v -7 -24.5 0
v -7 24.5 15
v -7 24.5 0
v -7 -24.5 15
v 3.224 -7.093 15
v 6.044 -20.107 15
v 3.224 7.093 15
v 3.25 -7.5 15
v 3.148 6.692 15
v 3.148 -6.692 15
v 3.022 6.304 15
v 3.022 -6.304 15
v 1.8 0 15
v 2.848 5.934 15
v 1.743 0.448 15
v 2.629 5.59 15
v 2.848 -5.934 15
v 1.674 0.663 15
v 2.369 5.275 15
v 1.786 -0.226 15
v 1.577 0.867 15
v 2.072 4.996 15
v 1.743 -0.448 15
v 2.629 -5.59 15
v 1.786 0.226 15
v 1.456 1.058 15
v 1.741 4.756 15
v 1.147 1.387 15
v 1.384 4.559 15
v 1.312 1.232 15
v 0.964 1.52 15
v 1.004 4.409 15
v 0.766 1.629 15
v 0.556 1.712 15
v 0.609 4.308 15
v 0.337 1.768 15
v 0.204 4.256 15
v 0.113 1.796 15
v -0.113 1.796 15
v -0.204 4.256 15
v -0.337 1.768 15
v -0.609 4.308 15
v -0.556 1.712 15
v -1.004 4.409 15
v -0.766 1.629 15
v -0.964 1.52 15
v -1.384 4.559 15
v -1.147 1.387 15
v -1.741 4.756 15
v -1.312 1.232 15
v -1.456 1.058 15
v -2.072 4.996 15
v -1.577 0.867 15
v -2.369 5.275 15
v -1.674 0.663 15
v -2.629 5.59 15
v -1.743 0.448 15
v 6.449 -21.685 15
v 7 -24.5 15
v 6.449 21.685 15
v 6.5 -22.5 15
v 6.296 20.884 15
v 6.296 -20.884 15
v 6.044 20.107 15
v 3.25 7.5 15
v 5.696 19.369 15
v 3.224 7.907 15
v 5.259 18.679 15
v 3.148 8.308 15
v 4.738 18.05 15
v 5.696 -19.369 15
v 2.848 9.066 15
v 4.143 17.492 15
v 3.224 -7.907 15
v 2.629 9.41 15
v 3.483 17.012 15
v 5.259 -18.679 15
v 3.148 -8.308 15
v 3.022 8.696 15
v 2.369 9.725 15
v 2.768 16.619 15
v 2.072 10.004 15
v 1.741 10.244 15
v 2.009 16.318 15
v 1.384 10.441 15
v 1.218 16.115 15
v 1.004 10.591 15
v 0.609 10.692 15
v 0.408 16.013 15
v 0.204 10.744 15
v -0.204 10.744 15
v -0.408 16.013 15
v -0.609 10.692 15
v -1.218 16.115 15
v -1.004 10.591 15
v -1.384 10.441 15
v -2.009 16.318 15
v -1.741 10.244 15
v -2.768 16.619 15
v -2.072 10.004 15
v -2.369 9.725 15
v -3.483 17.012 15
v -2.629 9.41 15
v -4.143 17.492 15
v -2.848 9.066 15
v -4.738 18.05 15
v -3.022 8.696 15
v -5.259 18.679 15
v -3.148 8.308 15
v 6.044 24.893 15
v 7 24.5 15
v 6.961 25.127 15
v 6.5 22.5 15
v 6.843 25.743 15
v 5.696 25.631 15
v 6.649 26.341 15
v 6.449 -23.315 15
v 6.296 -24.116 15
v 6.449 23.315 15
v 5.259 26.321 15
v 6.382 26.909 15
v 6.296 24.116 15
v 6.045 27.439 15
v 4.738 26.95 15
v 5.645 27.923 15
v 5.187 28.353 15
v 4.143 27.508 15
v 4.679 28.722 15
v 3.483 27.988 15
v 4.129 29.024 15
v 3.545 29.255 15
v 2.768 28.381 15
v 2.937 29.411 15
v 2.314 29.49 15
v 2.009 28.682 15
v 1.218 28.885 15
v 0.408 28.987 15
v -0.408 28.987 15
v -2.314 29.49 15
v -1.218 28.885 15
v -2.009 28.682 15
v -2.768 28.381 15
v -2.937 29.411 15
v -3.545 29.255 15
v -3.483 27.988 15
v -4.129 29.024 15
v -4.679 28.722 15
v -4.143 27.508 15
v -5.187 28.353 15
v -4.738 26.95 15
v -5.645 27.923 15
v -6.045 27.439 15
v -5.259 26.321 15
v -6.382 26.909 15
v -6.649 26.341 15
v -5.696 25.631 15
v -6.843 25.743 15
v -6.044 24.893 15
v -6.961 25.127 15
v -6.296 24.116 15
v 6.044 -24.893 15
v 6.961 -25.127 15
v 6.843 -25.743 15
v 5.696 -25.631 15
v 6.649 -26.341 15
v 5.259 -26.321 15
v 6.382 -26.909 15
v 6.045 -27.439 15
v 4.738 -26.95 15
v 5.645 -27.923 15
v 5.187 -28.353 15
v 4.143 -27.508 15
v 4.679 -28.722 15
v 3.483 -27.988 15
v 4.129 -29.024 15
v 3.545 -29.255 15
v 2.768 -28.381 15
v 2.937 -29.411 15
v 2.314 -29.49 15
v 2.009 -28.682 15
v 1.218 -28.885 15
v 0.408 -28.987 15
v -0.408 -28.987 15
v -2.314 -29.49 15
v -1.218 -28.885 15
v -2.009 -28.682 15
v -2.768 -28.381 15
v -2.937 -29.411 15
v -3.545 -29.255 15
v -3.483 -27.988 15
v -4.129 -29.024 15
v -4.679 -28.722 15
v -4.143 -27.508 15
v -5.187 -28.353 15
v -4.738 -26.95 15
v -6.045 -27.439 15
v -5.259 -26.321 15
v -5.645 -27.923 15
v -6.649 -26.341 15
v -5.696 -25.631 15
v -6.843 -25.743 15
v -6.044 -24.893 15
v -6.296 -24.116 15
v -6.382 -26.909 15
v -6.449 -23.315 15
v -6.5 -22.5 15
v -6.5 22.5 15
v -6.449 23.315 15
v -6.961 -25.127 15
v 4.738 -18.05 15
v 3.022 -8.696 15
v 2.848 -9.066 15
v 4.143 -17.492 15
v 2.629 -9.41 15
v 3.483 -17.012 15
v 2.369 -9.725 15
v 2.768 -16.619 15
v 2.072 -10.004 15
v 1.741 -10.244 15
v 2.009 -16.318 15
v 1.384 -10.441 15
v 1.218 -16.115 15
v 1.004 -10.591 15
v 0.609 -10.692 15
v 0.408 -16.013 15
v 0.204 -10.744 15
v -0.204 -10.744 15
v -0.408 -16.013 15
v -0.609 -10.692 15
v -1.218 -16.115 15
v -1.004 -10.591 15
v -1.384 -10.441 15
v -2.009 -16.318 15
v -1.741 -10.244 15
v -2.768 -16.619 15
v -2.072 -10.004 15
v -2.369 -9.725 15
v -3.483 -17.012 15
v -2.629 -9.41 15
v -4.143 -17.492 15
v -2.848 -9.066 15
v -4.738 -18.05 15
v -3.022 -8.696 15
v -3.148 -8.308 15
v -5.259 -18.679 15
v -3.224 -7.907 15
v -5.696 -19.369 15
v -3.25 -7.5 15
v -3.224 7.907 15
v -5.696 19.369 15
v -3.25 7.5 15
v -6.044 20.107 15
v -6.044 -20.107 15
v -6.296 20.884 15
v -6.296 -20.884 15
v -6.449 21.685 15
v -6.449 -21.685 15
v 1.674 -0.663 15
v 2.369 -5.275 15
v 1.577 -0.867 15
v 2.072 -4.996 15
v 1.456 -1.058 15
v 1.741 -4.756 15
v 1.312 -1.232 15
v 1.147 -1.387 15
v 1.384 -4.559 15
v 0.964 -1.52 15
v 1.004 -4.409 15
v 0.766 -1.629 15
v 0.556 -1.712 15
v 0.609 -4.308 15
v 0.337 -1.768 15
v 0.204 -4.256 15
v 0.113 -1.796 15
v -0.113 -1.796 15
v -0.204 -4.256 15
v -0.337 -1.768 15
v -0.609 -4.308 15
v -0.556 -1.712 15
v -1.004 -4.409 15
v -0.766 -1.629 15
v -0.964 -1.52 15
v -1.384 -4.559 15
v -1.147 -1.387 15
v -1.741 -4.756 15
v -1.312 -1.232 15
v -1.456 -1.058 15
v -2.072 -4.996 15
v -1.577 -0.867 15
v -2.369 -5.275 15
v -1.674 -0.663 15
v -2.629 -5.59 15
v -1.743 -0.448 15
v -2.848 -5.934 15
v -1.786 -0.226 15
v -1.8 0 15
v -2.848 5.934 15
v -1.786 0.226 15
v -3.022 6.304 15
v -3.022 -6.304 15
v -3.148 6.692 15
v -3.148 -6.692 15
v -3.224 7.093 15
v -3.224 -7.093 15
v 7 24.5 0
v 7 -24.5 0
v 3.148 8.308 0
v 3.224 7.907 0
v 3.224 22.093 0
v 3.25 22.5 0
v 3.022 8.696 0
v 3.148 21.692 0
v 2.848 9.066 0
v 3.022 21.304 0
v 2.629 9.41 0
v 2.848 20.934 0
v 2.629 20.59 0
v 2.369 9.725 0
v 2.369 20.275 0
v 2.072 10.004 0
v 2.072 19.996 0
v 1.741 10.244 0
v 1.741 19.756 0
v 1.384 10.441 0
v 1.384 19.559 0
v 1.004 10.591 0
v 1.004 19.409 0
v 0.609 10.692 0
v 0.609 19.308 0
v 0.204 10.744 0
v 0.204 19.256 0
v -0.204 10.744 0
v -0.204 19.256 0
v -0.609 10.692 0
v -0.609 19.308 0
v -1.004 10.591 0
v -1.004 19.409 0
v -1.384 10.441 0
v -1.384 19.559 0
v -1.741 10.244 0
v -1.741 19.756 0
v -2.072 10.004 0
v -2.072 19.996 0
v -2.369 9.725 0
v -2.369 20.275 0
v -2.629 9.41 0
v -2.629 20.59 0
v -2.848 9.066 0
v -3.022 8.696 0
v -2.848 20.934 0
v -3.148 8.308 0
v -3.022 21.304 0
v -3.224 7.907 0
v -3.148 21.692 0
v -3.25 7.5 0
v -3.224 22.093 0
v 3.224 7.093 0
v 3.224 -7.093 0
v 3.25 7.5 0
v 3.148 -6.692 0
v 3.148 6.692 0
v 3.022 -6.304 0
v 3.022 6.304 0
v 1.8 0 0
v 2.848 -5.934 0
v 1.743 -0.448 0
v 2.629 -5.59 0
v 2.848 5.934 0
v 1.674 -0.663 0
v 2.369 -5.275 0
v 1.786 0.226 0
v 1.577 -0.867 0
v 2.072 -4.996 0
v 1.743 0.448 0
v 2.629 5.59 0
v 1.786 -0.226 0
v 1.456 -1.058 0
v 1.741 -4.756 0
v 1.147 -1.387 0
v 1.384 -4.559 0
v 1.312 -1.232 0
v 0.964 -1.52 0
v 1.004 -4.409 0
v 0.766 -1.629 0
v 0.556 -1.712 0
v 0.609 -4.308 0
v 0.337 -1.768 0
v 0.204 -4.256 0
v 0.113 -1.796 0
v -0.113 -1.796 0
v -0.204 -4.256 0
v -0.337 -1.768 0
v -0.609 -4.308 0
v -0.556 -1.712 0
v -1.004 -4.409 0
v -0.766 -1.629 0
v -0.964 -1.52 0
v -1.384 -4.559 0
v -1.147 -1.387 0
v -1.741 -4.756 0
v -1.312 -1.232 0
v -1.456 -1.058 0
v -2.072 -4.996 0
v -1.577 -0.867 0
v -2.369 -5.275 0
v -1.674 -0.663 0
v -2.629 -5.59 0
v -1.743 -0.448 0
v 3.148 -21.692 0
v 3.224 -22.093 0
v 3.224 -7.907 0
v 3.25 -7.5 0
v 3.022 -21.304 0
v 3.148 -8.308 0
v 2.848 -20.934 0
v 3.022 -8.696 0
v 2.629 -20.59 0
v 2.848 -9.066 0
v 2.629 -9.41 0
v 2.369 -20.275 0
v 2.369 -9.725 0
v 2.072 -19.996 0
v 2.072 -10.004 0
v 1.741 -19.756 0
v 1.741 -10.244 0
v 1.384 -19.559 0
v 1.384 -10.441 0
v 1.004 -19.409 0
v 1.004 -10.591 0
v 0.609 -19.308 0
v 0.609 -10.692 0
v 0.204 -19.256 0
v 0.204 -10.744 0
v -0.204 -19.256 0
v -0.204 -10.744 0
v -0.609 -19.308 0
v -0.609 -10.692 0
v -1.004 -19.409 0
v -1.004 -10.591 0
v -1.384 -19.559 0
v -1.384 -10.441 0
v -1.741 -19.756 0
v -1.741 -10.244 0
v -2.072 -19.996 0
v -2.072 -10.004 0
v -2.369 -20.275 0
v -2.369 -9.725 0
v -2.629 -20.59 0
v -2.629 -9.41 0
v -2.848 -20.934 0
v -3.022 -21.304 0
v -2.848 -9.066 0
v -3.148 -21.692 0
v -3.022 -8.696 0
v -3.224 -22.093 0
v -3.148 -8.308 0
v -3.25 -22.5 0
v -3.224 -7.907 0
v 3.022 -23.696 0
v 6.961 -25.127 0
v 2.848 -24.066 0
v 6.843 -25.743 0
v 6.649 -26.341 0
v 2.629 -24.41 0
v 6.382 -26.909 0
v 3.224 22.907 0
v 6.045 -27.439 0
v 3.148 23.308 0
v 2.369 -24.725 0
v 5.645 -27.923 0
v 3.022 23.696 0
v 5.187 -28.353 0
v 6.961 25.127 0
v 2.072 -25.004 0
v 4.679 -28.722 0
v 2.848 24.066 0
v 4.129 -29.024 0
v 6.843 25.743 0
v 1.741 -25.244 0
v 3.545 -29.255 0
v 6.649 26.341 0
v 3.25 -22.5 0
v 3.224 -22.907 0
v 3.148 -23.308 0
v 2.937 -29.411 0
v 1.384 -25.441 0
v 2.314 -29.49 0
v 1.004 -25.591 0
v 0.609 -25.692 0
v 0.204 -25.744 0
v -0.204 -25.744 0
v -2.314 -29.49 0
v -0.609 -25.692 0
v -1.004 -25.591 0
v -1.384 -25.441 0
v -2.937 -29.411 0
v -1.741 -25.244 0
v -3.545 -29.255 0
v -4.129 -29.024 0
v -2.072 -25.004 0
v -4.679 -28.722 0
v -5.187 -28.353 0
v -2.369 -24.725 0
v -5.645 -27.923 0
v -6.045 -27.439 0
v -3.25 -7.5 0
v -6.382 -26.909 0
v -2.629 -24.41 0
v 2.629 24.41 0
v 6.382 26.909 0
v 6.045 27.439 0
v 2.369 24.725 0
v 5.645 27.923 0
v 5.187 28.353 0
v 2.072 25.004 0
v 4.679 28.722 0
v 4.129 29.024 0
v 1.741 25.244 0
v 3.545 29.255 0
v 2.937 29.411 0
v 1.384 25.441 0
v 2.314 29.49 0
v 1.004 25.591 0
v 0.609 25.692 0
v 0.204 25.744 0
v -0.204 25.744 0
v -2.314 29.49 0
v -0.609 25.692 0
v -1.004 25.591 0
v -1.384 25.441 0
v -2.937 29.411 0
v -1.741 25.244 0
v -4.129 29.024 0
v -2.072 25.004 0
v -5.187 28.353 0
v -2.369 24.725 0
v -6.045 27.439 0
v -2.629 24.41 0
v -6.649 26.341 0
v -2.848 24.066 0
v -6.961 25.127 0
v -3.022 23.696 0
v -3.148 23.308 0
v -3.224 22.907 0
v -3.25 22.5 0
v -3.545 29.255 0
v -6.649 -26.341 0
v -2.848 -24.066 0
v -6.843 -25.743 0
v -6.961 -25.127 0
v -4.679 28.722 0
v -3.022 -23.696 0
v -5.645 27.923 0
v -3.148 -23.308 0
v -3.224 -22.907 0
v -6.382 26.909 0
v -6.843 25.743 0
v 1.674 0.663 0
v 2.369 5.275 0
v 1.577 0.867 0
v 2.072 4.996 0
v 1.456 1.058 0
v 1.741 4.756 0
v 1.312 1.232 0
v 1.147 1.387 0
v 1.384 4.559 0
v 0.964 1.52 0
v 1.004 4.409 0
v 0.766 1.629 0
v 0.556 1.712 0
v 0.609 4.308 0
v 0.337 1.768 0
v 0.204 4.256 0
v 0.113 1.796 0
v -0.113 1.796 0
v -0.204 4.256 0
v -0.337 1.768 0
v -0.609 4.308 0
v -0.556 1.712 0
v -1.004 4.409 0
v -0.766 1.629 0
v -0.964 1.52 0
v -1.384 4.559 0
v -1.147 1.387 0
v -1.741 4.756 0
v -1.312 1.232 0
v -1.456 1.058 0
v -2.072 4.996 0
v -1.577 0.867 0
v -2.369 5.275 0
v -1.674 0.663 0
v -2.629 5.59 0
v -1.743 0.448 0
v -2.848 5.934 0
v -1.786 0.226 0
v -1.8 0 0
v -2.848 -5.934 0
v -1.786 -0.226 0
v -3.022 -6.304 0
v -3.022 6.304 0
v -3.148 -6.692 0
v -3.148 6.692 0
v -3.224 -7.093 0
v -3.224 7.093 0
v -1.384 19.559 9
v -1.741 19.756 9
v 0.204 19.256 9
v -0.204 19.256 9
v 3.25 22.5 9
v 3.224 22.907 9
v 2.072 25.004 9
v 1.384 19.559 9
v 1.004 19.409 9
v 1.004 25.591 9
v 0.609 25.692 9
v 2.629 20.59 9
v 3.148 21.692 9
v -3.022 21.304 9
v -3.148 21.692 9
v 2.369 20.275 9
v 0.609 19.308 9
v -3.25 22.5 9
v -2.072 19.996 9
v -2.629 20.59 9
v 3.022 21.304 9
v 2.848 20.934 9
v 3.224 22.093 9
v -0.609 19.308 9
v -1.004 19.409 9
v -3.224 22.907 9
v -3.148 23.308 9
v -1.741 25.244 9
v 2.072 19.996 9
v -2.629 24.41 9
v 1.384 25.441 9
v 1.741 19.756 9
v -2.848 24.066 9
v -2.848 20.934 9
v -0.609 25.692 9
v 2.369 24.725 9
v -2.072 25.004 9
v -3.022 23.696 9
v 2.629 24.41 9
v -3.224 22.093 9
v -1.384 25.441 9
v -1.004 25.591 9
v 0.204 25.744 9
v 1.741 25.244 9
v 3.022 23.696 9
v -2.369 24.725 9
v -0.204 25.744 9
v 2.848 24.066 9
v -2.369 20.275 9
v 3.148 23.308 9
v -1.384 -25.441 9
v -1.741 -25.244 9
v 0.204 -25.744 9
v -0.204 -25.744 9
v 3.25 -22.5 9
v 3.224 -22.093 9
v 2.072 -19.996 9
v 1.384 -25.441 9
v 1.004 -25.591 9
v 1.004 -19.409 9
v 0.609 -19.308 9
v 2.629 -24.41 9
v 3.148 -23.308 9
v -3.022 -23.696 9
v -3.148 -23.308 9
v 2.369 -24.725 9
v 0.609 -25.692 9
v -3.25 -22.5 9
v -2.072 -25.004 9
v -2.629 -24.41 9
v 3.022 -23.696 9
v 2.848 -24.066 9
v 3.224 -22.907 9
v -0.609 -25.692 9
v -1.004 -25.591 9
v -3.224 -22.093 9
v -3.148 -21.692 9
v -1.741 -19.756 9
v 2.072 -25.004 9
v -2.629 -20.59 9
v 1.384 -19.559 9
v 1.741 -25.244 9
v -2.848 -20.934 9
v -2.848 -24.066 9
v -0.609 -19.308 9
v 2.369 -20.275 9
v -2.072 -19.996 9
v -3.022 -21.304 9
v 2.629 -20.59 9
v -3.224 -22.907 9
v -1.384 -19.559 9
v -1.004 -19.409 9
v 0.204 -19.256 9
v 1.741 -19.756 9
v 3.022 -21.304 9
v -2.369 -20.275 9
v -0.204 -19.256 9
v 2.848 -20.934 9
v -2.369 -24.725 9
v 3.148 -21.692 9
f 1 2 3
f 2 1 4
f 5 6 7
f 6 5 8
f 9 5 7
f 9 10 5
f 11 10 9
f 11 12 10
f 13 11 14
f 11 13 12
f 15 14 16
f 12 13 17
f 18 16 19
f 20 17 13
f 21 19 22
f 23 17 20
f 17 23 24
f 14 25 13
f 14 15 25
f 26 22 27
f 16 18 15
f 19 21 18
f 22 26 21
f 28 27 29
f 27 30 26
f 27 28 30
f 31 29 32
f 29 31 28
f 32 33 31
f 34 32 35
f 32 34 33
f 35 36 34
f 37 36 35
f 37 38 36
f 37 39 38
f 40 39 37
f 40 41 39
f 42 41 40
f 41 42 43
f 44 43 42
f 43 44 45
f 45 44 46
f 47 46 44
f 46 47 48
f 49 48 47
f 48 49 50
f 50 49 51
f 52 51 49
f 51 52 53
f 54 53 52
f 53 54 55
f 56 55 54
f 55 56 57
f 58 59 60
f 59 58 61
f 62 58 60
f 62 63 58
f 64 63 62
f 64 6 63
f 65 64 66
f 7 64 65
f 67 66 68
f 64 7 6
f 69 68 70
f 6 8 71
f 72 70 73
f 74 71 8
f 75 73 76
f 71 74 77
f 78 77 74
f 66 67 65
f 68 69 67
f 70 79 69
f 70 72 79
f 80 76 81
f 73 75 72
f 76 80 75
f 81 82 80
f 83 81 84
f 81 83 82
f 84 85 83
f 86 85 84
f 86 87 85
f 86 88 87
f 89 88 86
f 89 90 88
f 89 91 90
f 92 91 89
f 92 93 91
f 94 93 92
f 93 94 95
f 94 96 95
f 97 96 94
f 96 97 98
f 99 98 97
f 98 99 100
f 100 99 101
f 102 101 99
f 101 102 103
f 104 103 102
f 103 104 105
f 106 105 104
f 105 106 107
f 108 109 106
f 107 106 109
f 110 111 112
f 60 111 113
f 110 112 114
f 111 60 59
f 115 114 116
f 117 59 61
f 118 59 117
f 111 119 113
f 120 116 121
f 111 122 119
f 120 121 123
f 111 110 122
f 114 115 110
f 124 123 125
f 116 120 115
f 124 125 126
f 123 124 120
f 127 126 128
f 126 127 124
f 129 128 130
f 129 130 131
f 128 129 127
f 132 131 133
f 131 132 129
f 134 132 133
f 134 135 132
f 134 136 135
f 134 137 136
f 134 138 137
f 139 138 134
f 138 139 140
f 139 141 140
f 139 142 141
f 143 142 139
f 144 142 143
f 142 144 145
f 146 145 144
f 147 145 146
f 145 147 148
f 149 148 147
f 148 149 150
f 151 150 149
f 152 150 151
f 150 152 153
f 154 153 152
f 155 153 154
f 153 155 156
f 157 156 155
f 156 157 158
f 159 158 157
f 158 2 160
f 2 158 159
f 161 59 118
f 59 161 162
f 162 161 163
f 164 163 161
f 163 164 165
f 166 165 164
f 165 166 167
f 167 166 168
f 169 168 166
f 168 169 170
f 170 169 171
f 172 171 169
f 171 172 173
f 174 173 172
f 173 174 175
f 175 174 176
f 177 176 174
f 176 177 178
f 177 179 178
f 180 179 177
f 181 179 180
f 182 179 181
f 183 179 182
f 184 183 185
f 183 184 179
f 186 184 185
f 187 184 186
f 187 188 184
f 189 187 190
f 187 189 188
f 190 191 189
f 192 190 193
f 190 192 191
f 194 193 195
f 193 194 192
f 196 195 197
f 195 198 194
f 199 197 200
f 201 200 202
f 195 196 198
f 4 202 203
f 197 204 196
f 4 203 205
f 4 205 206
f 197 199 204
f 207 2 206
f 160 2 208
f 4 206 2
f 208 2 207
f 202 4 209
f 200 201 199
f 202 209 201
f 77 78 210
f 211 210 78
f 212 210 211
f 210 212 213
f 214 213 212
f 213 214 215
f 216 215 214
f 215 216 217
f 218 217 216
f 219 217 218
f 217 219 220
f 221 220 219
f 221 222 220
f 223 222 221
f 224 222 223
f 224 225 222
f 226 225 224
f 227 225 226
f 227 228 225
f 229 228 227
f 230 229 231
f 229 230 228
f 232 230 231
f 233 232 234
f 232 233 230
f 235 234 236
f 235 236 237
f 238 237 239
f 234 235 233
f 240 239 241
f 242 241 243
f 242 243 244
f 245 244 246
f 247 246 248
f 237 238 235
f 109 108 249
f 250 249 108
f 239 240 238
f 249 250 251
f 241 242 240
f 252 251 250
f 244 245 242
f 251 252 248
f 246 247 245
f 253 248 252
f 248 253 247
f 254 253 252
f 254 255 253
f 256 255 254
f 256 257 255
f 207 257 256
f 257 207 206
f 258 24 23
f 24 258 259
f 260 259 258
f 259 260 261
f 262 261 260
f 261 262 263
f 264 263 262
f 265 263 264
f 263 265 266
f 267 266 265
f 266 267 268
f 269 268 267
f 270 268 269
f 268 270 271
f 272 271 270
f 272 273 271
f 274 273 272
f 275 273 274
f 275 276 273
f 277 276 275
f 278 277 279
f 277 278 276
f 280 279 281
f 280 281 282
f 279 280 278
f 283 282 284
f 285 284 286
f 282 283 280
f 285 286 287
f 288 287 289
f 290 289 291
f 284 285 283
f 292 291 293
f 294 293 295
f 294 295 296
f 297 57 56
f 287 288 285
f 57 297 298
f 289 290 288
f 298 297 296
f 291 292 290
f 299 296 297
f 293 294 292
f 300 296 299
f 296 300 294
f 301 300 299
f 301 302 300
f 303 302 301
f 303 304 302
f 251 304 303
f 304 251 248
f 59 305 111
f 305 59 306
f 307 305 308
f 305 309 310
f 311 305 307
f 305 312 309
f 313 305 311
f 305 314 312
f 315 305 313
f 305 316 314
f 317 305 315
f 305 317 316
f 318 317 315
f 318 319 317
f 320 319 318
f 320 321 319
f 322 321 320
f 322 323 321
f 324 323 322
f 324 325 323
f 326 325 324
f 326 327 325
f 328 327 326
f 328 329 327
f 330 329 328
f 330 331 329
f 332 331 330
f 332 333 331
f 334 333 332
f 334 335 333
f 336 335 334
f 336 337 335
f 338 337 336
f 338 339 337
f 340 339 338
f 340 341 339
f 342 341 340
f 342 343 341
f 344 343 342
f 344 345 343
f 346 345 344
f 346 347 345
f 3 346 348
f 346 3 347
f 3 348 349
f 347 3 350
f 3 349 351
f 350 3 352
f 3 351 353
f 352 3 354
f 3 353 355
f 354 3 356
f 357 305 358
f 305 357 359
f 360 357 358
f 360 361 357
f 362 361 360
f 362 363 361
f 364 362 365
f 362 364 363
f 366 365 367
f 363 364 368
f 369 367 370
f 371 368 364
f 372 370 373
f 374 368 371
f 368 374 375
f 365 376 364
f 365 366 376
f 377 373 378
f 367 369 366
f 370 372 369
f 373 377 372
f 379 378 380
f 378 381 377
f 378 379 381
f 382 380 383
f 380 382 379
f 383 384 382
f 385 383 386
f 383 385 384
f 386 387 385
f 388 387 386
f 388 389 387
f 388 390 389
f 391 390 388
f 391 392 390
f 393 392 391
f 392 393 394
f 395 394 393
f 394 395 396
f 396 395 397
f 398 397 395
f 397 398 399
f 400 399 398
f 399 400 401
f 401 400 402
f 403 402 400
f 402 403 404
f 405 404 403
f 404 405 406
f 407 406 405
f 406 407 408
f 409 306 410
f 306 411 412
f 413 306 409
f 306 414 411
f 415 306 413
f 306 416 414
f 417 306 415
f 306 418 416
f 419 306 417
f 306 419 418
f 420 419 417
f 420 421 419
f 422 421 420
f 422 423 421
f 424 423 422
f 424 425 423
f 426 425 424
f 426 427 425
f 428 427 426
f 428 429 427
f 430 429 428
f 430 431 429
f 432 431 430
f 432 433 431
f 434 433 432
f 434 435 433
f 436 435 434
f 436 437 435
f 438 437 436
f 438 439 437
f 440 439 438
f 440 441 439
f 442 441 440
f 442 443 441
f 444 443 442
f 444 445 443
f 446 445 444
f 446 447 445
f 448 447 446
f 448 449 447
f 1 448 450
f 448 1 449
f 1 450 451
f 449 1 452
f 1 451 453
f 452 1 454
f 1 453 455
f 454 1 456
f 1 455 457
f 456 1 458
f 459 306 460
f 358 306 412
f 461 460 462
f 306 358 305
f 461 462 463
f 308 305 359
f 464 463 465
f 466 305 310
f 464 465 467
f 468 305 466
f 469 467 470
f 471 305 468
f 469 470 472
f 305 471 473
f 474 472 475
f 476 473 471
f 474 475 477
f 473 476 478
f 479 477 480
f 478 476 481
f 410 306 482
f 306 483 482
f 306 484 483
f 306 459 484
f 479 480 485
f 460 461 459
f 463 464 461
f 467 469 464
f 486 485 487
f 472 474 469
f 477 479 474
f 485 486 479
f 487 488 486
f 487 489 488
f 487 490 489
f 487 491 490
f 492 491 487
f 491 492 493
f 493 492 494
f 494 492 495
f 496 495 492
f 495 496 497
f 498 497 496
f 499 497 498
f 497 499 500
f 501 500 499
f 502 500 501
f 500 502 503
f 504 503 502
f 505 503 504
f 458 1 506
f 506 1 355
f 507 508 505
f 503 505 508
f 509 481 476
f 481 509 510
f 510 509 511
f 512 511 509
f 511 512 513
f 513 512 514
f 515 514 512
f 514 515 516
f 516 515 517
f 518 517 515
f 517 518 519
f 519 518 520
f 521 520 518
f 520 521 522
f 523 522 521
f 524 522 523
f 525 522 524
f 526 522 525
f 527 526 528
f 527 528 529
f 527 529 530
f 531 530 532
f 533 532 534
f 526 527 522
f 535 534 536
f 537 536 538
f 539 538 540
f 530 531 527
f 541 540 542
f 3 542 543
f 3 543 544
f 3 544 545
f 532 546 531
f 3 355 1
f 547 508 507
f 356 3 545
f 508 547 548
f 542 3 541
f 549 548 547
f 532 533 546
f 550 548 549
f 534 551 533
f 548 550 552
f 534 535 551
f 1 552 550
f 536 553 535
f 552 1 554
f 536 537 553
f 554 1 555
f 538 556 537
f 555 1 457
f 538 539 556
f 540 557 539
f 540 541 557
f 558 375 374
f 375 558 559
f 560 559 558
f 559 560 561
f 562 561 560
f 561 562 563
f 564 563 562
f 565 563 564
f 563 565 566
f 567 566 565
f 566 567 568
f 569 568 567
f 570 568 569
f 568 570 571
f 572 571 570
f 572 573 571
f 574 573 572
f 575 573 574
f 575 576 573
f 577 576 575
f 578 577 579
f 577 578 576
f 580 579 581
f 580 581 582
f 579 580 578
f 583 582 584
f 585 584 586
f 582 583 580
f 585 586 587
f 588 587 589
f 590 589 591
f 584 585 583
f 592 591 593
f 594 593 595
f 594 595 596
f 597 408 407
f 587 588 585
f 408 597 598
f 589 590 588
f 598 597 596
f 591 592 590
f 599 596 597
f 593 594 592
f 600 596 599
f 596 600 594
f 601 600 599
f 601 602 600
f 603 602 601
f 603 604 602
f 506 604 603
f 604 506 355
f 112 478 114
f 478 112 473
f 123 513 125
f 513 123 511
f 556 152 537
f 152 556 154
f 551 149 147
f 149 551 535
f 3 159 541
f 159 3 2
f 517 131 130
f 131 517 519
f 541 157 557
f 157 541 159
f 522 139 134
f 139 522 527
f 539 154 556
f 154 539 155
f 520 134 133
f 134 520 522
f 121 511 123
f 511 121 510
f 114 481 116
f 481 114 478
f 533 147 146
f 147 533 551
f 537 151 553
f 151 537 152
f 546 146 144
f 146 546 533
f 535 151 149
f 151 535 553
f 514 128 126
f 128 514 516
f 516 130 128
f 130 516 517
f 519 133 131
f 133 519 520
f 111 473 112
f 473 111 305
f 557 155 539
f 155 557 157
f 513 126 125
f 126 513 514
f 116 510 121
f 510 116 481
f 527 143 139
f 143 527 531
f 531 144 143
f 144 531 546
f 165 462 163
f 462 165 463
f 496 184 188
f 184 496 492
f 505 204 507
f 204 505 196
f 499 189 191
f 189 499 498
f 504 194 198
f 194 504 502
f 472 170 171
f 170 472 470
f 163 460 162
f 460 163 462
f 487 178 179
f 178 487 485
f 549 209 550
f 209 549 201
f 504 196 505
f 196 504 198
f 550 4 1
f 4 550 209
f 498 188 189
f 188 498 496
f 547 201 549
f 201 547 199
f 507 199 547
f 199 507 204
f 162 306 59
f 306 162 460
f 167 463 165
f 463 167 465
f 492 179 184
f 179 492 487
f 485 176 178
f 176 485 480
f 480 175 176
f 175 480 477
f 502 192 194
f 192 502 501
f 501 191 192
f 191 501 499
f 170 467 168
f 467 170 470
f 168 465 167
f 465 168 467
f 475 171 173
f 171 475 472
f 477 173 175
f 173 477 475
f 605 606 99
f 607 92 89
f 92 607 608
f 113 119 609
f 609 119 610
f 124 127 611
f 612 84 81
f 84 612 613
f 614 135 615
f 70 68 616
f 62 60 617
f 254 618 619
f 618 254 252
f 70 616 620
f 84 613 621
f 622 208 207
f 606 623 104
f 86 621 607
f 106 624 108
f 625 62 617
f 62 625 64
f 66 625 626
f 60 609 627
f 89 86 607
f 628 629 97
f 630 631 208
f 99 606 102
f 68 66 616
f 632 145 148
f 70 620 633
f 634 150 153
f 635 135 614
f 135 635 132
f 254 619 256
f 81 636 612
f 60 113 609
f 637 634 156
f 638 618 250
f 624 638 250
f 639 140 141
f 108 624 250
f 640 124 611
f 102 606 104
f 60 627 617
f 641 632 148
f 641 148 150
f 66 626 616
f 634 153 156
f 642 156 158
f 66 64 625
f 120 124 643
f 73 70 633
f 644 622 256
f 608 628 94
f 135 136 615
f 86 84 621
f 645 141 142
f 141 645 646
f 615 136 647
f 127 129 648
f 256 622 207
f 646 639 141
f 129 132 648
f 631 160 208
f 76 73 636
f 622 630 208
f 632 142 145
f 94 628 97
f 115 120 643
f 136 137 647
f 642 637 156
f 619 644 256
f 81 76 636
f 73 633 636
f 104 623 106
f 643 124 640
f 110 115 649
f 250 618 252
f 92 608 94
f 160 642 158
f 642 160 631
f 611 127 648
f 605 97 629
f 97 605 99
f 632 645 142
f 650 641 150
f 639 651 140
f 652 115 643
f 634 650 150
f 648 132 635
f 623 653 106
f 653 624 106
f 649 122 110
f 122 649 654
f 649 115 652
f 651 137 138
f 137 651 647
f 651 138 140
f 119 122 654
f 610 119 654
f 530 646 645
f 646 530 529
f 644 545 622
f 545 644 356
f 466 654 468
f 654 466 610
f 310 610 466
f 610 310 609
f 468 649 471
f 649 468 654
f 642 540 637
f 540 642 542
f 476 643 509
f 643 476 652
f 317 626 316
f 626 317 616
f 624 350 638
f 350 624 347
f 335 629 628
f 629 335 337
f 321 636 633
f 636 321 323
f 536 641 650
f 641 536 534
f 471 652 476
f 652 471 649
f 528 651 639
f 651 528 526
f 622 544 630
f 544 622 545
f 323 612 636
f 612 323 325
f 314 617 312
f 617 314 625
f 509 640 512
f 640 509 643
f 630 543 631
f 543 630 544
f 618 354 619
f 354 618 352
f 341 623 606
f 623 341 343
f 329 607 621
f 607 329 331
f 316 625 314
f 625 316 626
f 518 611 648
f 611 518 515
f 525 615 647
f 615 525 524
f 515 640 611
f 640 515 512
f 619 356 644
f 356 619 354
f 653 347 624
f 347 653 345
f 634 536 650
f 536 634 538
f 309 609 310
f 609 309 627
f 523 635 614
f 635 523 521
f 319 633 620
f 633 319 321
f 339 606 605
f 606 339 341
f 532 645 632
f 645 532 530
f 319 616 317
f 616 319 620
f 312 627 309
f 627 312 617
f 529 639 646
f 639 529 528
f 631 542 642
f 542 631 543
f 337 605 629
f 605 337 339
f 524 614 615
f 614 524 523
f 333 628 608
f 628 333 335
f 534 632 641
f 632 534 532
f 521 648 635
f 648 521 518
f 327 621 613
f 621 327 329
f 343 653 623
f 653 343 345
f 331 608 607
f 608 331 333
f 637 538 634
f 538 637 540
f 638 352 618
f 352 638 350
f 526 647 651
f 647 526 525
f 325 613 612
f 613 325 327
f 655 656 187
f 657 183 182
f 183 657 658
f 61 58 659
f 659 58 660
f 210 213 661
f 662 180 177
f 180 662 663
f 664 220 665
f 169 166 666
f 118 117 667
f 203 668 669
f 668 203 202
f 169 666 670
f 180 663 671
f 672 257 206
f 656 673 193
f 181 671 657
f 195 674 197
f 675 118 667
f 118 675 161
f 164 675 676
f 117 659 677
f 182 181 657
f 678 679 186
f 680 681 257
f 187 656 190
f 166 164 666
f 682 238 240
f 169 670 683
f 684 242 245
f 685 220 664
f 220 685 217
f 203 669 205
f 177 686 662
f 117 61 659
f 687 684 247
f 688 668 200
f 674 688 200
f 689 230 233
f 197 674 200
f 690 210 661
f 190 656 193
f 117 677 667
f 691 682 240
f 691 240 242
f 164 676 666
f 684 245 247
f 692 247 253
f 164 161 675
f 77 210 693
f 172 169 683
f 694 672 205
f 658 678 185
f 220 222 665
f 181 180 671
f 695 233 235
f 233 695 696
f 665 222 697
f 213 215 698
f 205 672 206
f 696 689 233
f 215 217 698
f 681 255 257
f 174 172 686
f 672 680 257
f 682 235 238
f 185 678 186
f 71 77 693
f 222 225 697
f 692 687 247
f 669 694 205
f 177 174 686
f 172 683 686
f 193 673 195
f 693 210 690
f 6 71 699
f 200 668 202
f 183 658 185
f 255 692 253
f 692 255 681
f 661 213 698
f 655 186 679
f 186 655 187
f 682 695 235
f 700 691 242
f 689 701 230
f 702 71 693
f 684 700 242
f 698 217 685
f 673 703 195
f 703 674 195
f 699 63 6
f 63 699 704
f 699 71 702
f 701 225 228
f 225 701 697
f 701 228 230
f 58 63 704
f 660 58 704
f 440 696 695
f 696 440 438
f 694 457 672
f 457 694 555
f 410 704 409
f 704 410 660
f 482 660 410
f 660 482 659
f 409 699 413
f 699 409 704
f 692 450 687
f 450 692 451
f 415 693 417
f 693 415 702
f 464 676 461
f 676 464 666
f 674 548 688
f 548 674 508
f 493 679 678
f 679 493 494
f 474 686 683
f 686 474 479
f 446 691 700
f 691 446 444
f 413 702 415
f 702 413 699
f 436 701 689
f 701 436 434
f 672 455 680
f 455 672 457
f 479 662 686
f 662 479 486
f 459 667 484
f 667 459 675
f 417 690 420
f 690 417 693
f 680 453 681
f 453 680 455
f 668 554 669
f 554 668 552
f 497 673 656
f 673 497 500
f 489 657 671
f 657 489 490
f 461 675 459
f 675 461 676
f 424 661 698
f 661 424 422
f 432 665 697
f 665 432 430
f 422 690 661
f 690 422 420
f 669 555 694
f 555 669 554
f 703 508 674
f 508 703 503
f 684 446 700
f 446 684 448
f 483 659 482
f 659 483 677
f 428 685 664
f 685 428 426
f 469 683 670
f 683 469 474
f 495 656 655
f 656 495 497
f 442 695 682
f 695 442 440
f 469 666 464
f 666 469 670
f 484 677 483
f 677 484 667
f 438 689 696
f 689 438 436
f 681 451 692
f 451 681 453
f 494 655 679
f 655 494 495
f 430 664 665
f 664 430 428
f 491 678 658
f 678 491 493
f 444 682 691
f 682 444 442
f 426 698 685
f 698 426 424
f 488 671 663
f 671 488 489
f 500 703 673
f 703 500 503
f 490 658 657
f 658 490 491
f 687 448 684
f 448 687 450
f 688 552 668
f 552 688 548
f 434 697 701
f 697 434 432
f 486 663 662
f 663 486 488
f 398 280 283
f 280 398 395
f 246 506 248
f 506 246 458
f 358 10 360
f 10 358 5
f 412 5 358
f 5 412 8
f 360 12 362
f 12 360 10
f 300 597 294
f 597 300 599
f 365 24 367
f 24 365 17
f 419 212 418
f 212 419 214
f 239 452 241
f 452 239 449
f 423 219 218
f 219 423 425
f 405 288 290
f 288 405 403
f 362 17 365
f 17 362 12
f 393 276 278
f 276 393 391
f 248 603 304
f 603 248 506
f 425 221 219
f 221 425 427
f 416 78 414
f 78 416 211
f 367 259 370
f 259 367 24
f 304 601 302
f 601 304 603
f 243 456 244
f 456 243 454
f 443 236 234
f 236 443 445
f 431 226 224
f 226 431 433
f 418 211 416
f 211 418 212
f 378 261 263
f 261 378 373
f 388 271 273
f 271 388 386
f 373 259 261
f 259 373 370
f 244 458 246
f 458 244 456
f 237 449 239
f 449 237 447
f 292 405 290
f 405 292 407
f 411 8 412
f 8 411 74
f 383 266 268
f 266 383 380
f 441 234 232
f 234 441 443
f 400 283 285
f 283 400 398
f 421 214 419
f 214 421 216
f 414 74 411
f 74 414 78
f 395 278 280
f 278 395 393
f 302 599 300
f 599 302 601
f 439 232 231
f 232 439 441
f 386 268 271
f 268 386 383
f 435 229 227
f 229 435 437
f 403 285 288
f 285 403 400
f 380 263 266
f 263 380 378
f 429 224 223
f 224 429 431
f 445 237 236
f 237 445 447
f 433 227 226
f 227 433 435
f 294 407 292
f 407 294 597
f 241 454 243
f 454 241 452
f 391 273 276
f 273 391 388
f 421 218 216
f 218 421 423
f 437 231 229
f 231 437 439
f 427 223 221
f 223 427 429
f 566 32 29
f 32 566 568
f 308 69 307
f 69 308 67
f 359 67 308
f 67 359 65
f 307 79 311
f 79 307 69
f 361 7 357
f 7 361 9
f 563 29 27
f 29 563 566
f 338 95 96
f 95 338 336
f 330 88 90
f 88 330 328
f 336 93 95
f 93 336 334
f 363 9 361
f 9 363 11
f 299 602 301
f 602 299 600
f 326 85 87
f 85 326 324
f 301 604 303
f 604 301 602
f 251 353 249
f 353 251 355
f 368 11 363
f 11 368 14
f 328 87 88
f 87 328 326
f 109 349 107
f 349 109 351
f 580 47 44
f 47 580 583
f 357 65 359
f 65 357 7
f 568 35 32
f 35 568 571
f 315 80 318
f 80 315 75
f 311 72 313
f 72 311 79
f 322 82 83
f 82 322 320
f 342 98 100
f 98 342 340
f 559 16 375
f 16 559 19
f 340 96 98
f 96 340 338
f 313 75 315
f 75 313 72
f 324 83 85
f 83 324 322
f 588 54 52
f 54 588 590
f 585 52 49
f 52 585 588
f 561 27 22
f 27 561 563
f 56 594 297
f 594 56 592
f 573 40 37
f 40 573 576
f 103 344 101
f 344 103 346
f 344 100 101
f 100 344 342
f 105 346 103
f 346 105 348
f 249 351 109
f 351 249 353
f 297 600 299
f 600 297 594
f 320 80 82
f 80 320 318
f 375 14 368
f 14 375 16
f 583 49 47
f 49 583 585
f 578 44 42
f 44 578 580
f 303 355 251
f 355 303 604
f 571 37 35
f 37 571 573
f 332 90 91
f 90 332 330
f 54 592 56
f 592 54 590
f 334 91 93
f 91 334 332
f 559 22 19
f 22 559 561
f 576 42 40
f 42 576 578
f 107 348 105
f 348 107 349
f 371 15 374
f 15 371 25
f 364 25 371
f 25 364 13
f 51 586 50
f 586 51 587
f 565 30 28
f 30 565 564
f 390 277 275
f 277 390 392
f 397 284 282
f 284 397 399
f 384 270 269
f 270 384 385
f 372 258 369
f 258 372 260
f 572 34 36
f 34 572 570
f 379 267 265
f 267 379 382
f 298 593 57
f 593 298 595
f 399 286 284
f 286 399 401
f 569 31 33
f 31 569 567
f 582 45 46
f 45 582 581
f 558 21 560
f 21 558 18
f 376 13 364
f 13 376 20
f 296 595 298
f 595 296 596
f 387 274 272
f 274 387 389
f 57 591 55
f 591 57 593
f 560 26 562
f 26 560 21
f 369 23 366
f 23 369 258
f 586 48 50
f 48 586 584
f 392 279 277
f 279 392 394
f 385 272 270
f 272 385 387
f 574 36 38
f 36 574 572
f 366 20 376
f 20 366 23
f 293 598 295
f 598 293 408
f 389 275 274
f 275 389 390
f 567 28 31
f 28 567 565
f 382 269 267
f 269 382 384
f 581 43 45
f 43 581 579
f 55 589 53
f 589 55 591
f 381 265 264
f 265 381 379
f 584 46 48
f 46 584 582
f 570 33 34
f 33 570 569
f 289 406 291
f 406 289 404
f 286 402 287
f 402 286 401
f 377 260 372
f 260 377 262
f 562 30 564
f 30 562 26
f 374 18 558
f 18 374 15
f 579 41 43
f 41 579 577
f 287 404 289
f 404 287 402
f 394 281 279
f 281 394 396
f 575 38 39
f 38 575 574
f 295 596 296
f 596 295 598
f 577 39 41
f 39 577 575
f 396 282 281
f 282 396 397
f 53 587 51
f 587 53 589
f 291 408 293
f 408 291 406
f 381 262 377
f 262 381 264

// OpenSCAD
$fn = 50;


difference() {
	union() {
		hull() {
			translate(v = [-2.0000000000, 9.5000000000, 0]) {
				cylinder(h = 15, r = 5);
			}
			translate(v = [2.0000000000, 9.5000000000, 0]) {
				cylinder(h = 15, r = 5);
			}
			translate(v = [-2.0000000000, -9.5000000000, 0]) {
				cylinder(h = 15, r = 5);
			}
			translate(v = [2.0000000000, -9.5000000000, 0]) {
				cylinder(h = 15, r = 5);
			}
		}
		translate(v = [0.0000000000, 15.0000000000, 0]) {
			hull() {
				translate(v = [-2.0000000000, 9.5000000000, 0]) {
					cylinder(h = 15, r = 5);
				}
				translate(v = [2.0000000000, 9.5000000000, 0]) {
					cylinder(h = 15, r = 5);
				}
				translate(v = [-2.0000000000, -9.5000000000, 0]) {
					cylinder(h = 15, r = 5);
				}
				translate(v = [2.0000000000, -9.5000000000, 0]) {
					cylinder(h = 15, r = 5);
				}
			}
		}
		translate(v = [0.0000000000, 15.0000000000, 0]) {
			hull() {
				translate(v = [-2.0000000000, 9.5000000000, 0]) {
					cylinder(h = 15, r = 5);
				}
				translate(v = [2.0000000000, 9.5000000000, 0]) {
					cylinder(h = 15, r = 5);
				}
				translate(v = [-2.0000000000, -9.5000000000, 0]) {
					cylinder(h = 15, r = 5);
				}
				translate(v = [2.0000000000, -9.5000000000, 0]) {
					cylinder(h = 15, r = 5);
				}
			}
		}
		translate(v = [0.0000000000, -15.0000000000, 0]) {
			hull() {
				translate(v = [-2.0000000000, 9.5000000000, 0]) {
					cylinder(h = 15, r = 5);
				}
				translate(v = [2.0000000000, 9.5000000000, 0]) {
					cylinder(h = 15, r = 5);
				}
				translate(v = [-2.0000000000, -9.5000000000, 0]) {
					cylinder(h = 15, r = 5);
				}
				translate(v = [2.0000000000, -9.5000000000, 0]) {
					cylinder(h = 15, r = 5);
				}
			}
		}
		translate(v = [0.0000000000, -15.0000000000, 0]) {
			hull() {
				translate(v = [-2.0000000000, 9.5000000000, 0]) {
					cylinder(h = 15, r = 5);
				}
				translate(v = [2.0000000000, 9.5000000000, 0]) {
					cylinder(h = 15, r = 5);
				}
				translate(v = [-2.0000000000, -9.5000000000, 0]) {
					cylinder(h = 15, r = 5);
				}
				translate(v = [2.0000000000, -9.5000000000, 0]) {
					cylinder(h = 15, r = 5);
				}
			}
		}
	}
	union() {
		translate(v = [0.0000000000, 22.5000000000, 15]) {
			rotate(a = [0, 0, 0]) {
				difference() {
					union() {
						#translate(v = [0, 0, -15.0000000000]) {
							cylinder(h = 15, r = 2.2500000000);
						}
						#translate(v = [0, 0, -6]) {
							cylinder(h = 6, r1 = 3.2500000000, r2 = 6.5000000000);
						}
						#translate(v = [0, 0, -15.0000000000]) {
							cylinder(h = 15, r = 3.2500000000);
						}
						#translate(v = [0, 0, -15.0000000000]) {
							cylinder(h = 15, r = 2.2500000000);
						}
					}
					union();
				}
			}
		}
		translate(v = [0.0000000000, 22.5000000000, 15]) {
			rotate(a = [0, 0, 0]) {
				difference() {
					union() {
						#translate(v = [0, 0, -15.0000000000]) {
							cylinder(h = 15, r = 2.2500000000);
						}
						#translate(v = [0, 0, -6]) {
							cylinder(h = 6, r1 = 3.2500000000, r2 = 6.5000000000);
						}
						#translate(v = [0, 0, -15.0000000000]) {
							cylinder(h = 15, r = 3.2500000000);
						}
						#translate(v = [0, 0, -15.0000000000]) {
							cylinder(h = 15, r = 2.2500000000);
						}
					}
					union();
				}
			}
		}
		translate(v = [0.0000000000, -22.5000000000, 15]) {
			rotate(a = [0, 0, 0]) {
				difference() {
					union() {
						#translate(v = [0, 0, -15.0000000000]) {
							cylinder(h = 15, r = 2.2500000000);
						}
						#translate(v = [0, 0, -6]) {
							cylinder(h = 6, r1 = 3.2500000000, r2 = 6.5000000000);
						}
						#translate(v = [0, 0, -15.0000000000]) {
							cylinder(h = 15, r = 3.2500000000);
						}
						#translate(v = [0, 0, -15.0000000000]) {
							cylinder(h = 15, r = 2.2500000000);
						}
					}
					union();
				}
			}
		}
		translate(v = [0.0000000000, -22.5000000000, 15]) {
			rotate(a = [0, 0, 0]) {
				difference() {
					union() {
						#translate(v = [0, 0, -15.0000000000]) {
							cylinder(h = 15, r = 2.2500000000);
						}
						#translate(v = [0, 0, -6]) {
							cylinder(h = 6, r1 = 3.2500000000, r2 = 6.5000000000);
						}
						#translate(v = [0, 0, -15.0000000000]) {
							cylinder(h = 15, r = 3.2500000000);
						}
						#translate(v = [0, 0, -15.0000000000]) {
							cylinder(h = 15, r = 2.2500000000);
						}
					}
					union();
				}
			}
		}
		translate(v = [0.0000000000, -7.5000000000, 0]) {
			translate(v = [0, 0, -100]) {
				cylinder(h = 200, r = 3.2500000000);
			}
		}
		translate(v = [0.0000000000, 7.5000000000, 0]) {
			translate(v = [0, 0, -100]) {
				cylinder(h = 200, r = 3.2500000000);
			}
		}
		translate(v = [0.0000000000, -7.5000000000, 0]) {
			translate(v = [0, 0, -100]) {
				cylinder(h = 200, r = 1.8000000000);
			}
		}
		translate(v = [0, 0, -100]) {
			cylinder(h = 200, r = 1.8000000000);
		}
		translate(v = [0.0000000000, 7.5000000000, 0]) {
			translate(v = [0, 0, -100]) {
				cylinder(h = 200, r = 1.8000000000);
			}
		}
	}
}
